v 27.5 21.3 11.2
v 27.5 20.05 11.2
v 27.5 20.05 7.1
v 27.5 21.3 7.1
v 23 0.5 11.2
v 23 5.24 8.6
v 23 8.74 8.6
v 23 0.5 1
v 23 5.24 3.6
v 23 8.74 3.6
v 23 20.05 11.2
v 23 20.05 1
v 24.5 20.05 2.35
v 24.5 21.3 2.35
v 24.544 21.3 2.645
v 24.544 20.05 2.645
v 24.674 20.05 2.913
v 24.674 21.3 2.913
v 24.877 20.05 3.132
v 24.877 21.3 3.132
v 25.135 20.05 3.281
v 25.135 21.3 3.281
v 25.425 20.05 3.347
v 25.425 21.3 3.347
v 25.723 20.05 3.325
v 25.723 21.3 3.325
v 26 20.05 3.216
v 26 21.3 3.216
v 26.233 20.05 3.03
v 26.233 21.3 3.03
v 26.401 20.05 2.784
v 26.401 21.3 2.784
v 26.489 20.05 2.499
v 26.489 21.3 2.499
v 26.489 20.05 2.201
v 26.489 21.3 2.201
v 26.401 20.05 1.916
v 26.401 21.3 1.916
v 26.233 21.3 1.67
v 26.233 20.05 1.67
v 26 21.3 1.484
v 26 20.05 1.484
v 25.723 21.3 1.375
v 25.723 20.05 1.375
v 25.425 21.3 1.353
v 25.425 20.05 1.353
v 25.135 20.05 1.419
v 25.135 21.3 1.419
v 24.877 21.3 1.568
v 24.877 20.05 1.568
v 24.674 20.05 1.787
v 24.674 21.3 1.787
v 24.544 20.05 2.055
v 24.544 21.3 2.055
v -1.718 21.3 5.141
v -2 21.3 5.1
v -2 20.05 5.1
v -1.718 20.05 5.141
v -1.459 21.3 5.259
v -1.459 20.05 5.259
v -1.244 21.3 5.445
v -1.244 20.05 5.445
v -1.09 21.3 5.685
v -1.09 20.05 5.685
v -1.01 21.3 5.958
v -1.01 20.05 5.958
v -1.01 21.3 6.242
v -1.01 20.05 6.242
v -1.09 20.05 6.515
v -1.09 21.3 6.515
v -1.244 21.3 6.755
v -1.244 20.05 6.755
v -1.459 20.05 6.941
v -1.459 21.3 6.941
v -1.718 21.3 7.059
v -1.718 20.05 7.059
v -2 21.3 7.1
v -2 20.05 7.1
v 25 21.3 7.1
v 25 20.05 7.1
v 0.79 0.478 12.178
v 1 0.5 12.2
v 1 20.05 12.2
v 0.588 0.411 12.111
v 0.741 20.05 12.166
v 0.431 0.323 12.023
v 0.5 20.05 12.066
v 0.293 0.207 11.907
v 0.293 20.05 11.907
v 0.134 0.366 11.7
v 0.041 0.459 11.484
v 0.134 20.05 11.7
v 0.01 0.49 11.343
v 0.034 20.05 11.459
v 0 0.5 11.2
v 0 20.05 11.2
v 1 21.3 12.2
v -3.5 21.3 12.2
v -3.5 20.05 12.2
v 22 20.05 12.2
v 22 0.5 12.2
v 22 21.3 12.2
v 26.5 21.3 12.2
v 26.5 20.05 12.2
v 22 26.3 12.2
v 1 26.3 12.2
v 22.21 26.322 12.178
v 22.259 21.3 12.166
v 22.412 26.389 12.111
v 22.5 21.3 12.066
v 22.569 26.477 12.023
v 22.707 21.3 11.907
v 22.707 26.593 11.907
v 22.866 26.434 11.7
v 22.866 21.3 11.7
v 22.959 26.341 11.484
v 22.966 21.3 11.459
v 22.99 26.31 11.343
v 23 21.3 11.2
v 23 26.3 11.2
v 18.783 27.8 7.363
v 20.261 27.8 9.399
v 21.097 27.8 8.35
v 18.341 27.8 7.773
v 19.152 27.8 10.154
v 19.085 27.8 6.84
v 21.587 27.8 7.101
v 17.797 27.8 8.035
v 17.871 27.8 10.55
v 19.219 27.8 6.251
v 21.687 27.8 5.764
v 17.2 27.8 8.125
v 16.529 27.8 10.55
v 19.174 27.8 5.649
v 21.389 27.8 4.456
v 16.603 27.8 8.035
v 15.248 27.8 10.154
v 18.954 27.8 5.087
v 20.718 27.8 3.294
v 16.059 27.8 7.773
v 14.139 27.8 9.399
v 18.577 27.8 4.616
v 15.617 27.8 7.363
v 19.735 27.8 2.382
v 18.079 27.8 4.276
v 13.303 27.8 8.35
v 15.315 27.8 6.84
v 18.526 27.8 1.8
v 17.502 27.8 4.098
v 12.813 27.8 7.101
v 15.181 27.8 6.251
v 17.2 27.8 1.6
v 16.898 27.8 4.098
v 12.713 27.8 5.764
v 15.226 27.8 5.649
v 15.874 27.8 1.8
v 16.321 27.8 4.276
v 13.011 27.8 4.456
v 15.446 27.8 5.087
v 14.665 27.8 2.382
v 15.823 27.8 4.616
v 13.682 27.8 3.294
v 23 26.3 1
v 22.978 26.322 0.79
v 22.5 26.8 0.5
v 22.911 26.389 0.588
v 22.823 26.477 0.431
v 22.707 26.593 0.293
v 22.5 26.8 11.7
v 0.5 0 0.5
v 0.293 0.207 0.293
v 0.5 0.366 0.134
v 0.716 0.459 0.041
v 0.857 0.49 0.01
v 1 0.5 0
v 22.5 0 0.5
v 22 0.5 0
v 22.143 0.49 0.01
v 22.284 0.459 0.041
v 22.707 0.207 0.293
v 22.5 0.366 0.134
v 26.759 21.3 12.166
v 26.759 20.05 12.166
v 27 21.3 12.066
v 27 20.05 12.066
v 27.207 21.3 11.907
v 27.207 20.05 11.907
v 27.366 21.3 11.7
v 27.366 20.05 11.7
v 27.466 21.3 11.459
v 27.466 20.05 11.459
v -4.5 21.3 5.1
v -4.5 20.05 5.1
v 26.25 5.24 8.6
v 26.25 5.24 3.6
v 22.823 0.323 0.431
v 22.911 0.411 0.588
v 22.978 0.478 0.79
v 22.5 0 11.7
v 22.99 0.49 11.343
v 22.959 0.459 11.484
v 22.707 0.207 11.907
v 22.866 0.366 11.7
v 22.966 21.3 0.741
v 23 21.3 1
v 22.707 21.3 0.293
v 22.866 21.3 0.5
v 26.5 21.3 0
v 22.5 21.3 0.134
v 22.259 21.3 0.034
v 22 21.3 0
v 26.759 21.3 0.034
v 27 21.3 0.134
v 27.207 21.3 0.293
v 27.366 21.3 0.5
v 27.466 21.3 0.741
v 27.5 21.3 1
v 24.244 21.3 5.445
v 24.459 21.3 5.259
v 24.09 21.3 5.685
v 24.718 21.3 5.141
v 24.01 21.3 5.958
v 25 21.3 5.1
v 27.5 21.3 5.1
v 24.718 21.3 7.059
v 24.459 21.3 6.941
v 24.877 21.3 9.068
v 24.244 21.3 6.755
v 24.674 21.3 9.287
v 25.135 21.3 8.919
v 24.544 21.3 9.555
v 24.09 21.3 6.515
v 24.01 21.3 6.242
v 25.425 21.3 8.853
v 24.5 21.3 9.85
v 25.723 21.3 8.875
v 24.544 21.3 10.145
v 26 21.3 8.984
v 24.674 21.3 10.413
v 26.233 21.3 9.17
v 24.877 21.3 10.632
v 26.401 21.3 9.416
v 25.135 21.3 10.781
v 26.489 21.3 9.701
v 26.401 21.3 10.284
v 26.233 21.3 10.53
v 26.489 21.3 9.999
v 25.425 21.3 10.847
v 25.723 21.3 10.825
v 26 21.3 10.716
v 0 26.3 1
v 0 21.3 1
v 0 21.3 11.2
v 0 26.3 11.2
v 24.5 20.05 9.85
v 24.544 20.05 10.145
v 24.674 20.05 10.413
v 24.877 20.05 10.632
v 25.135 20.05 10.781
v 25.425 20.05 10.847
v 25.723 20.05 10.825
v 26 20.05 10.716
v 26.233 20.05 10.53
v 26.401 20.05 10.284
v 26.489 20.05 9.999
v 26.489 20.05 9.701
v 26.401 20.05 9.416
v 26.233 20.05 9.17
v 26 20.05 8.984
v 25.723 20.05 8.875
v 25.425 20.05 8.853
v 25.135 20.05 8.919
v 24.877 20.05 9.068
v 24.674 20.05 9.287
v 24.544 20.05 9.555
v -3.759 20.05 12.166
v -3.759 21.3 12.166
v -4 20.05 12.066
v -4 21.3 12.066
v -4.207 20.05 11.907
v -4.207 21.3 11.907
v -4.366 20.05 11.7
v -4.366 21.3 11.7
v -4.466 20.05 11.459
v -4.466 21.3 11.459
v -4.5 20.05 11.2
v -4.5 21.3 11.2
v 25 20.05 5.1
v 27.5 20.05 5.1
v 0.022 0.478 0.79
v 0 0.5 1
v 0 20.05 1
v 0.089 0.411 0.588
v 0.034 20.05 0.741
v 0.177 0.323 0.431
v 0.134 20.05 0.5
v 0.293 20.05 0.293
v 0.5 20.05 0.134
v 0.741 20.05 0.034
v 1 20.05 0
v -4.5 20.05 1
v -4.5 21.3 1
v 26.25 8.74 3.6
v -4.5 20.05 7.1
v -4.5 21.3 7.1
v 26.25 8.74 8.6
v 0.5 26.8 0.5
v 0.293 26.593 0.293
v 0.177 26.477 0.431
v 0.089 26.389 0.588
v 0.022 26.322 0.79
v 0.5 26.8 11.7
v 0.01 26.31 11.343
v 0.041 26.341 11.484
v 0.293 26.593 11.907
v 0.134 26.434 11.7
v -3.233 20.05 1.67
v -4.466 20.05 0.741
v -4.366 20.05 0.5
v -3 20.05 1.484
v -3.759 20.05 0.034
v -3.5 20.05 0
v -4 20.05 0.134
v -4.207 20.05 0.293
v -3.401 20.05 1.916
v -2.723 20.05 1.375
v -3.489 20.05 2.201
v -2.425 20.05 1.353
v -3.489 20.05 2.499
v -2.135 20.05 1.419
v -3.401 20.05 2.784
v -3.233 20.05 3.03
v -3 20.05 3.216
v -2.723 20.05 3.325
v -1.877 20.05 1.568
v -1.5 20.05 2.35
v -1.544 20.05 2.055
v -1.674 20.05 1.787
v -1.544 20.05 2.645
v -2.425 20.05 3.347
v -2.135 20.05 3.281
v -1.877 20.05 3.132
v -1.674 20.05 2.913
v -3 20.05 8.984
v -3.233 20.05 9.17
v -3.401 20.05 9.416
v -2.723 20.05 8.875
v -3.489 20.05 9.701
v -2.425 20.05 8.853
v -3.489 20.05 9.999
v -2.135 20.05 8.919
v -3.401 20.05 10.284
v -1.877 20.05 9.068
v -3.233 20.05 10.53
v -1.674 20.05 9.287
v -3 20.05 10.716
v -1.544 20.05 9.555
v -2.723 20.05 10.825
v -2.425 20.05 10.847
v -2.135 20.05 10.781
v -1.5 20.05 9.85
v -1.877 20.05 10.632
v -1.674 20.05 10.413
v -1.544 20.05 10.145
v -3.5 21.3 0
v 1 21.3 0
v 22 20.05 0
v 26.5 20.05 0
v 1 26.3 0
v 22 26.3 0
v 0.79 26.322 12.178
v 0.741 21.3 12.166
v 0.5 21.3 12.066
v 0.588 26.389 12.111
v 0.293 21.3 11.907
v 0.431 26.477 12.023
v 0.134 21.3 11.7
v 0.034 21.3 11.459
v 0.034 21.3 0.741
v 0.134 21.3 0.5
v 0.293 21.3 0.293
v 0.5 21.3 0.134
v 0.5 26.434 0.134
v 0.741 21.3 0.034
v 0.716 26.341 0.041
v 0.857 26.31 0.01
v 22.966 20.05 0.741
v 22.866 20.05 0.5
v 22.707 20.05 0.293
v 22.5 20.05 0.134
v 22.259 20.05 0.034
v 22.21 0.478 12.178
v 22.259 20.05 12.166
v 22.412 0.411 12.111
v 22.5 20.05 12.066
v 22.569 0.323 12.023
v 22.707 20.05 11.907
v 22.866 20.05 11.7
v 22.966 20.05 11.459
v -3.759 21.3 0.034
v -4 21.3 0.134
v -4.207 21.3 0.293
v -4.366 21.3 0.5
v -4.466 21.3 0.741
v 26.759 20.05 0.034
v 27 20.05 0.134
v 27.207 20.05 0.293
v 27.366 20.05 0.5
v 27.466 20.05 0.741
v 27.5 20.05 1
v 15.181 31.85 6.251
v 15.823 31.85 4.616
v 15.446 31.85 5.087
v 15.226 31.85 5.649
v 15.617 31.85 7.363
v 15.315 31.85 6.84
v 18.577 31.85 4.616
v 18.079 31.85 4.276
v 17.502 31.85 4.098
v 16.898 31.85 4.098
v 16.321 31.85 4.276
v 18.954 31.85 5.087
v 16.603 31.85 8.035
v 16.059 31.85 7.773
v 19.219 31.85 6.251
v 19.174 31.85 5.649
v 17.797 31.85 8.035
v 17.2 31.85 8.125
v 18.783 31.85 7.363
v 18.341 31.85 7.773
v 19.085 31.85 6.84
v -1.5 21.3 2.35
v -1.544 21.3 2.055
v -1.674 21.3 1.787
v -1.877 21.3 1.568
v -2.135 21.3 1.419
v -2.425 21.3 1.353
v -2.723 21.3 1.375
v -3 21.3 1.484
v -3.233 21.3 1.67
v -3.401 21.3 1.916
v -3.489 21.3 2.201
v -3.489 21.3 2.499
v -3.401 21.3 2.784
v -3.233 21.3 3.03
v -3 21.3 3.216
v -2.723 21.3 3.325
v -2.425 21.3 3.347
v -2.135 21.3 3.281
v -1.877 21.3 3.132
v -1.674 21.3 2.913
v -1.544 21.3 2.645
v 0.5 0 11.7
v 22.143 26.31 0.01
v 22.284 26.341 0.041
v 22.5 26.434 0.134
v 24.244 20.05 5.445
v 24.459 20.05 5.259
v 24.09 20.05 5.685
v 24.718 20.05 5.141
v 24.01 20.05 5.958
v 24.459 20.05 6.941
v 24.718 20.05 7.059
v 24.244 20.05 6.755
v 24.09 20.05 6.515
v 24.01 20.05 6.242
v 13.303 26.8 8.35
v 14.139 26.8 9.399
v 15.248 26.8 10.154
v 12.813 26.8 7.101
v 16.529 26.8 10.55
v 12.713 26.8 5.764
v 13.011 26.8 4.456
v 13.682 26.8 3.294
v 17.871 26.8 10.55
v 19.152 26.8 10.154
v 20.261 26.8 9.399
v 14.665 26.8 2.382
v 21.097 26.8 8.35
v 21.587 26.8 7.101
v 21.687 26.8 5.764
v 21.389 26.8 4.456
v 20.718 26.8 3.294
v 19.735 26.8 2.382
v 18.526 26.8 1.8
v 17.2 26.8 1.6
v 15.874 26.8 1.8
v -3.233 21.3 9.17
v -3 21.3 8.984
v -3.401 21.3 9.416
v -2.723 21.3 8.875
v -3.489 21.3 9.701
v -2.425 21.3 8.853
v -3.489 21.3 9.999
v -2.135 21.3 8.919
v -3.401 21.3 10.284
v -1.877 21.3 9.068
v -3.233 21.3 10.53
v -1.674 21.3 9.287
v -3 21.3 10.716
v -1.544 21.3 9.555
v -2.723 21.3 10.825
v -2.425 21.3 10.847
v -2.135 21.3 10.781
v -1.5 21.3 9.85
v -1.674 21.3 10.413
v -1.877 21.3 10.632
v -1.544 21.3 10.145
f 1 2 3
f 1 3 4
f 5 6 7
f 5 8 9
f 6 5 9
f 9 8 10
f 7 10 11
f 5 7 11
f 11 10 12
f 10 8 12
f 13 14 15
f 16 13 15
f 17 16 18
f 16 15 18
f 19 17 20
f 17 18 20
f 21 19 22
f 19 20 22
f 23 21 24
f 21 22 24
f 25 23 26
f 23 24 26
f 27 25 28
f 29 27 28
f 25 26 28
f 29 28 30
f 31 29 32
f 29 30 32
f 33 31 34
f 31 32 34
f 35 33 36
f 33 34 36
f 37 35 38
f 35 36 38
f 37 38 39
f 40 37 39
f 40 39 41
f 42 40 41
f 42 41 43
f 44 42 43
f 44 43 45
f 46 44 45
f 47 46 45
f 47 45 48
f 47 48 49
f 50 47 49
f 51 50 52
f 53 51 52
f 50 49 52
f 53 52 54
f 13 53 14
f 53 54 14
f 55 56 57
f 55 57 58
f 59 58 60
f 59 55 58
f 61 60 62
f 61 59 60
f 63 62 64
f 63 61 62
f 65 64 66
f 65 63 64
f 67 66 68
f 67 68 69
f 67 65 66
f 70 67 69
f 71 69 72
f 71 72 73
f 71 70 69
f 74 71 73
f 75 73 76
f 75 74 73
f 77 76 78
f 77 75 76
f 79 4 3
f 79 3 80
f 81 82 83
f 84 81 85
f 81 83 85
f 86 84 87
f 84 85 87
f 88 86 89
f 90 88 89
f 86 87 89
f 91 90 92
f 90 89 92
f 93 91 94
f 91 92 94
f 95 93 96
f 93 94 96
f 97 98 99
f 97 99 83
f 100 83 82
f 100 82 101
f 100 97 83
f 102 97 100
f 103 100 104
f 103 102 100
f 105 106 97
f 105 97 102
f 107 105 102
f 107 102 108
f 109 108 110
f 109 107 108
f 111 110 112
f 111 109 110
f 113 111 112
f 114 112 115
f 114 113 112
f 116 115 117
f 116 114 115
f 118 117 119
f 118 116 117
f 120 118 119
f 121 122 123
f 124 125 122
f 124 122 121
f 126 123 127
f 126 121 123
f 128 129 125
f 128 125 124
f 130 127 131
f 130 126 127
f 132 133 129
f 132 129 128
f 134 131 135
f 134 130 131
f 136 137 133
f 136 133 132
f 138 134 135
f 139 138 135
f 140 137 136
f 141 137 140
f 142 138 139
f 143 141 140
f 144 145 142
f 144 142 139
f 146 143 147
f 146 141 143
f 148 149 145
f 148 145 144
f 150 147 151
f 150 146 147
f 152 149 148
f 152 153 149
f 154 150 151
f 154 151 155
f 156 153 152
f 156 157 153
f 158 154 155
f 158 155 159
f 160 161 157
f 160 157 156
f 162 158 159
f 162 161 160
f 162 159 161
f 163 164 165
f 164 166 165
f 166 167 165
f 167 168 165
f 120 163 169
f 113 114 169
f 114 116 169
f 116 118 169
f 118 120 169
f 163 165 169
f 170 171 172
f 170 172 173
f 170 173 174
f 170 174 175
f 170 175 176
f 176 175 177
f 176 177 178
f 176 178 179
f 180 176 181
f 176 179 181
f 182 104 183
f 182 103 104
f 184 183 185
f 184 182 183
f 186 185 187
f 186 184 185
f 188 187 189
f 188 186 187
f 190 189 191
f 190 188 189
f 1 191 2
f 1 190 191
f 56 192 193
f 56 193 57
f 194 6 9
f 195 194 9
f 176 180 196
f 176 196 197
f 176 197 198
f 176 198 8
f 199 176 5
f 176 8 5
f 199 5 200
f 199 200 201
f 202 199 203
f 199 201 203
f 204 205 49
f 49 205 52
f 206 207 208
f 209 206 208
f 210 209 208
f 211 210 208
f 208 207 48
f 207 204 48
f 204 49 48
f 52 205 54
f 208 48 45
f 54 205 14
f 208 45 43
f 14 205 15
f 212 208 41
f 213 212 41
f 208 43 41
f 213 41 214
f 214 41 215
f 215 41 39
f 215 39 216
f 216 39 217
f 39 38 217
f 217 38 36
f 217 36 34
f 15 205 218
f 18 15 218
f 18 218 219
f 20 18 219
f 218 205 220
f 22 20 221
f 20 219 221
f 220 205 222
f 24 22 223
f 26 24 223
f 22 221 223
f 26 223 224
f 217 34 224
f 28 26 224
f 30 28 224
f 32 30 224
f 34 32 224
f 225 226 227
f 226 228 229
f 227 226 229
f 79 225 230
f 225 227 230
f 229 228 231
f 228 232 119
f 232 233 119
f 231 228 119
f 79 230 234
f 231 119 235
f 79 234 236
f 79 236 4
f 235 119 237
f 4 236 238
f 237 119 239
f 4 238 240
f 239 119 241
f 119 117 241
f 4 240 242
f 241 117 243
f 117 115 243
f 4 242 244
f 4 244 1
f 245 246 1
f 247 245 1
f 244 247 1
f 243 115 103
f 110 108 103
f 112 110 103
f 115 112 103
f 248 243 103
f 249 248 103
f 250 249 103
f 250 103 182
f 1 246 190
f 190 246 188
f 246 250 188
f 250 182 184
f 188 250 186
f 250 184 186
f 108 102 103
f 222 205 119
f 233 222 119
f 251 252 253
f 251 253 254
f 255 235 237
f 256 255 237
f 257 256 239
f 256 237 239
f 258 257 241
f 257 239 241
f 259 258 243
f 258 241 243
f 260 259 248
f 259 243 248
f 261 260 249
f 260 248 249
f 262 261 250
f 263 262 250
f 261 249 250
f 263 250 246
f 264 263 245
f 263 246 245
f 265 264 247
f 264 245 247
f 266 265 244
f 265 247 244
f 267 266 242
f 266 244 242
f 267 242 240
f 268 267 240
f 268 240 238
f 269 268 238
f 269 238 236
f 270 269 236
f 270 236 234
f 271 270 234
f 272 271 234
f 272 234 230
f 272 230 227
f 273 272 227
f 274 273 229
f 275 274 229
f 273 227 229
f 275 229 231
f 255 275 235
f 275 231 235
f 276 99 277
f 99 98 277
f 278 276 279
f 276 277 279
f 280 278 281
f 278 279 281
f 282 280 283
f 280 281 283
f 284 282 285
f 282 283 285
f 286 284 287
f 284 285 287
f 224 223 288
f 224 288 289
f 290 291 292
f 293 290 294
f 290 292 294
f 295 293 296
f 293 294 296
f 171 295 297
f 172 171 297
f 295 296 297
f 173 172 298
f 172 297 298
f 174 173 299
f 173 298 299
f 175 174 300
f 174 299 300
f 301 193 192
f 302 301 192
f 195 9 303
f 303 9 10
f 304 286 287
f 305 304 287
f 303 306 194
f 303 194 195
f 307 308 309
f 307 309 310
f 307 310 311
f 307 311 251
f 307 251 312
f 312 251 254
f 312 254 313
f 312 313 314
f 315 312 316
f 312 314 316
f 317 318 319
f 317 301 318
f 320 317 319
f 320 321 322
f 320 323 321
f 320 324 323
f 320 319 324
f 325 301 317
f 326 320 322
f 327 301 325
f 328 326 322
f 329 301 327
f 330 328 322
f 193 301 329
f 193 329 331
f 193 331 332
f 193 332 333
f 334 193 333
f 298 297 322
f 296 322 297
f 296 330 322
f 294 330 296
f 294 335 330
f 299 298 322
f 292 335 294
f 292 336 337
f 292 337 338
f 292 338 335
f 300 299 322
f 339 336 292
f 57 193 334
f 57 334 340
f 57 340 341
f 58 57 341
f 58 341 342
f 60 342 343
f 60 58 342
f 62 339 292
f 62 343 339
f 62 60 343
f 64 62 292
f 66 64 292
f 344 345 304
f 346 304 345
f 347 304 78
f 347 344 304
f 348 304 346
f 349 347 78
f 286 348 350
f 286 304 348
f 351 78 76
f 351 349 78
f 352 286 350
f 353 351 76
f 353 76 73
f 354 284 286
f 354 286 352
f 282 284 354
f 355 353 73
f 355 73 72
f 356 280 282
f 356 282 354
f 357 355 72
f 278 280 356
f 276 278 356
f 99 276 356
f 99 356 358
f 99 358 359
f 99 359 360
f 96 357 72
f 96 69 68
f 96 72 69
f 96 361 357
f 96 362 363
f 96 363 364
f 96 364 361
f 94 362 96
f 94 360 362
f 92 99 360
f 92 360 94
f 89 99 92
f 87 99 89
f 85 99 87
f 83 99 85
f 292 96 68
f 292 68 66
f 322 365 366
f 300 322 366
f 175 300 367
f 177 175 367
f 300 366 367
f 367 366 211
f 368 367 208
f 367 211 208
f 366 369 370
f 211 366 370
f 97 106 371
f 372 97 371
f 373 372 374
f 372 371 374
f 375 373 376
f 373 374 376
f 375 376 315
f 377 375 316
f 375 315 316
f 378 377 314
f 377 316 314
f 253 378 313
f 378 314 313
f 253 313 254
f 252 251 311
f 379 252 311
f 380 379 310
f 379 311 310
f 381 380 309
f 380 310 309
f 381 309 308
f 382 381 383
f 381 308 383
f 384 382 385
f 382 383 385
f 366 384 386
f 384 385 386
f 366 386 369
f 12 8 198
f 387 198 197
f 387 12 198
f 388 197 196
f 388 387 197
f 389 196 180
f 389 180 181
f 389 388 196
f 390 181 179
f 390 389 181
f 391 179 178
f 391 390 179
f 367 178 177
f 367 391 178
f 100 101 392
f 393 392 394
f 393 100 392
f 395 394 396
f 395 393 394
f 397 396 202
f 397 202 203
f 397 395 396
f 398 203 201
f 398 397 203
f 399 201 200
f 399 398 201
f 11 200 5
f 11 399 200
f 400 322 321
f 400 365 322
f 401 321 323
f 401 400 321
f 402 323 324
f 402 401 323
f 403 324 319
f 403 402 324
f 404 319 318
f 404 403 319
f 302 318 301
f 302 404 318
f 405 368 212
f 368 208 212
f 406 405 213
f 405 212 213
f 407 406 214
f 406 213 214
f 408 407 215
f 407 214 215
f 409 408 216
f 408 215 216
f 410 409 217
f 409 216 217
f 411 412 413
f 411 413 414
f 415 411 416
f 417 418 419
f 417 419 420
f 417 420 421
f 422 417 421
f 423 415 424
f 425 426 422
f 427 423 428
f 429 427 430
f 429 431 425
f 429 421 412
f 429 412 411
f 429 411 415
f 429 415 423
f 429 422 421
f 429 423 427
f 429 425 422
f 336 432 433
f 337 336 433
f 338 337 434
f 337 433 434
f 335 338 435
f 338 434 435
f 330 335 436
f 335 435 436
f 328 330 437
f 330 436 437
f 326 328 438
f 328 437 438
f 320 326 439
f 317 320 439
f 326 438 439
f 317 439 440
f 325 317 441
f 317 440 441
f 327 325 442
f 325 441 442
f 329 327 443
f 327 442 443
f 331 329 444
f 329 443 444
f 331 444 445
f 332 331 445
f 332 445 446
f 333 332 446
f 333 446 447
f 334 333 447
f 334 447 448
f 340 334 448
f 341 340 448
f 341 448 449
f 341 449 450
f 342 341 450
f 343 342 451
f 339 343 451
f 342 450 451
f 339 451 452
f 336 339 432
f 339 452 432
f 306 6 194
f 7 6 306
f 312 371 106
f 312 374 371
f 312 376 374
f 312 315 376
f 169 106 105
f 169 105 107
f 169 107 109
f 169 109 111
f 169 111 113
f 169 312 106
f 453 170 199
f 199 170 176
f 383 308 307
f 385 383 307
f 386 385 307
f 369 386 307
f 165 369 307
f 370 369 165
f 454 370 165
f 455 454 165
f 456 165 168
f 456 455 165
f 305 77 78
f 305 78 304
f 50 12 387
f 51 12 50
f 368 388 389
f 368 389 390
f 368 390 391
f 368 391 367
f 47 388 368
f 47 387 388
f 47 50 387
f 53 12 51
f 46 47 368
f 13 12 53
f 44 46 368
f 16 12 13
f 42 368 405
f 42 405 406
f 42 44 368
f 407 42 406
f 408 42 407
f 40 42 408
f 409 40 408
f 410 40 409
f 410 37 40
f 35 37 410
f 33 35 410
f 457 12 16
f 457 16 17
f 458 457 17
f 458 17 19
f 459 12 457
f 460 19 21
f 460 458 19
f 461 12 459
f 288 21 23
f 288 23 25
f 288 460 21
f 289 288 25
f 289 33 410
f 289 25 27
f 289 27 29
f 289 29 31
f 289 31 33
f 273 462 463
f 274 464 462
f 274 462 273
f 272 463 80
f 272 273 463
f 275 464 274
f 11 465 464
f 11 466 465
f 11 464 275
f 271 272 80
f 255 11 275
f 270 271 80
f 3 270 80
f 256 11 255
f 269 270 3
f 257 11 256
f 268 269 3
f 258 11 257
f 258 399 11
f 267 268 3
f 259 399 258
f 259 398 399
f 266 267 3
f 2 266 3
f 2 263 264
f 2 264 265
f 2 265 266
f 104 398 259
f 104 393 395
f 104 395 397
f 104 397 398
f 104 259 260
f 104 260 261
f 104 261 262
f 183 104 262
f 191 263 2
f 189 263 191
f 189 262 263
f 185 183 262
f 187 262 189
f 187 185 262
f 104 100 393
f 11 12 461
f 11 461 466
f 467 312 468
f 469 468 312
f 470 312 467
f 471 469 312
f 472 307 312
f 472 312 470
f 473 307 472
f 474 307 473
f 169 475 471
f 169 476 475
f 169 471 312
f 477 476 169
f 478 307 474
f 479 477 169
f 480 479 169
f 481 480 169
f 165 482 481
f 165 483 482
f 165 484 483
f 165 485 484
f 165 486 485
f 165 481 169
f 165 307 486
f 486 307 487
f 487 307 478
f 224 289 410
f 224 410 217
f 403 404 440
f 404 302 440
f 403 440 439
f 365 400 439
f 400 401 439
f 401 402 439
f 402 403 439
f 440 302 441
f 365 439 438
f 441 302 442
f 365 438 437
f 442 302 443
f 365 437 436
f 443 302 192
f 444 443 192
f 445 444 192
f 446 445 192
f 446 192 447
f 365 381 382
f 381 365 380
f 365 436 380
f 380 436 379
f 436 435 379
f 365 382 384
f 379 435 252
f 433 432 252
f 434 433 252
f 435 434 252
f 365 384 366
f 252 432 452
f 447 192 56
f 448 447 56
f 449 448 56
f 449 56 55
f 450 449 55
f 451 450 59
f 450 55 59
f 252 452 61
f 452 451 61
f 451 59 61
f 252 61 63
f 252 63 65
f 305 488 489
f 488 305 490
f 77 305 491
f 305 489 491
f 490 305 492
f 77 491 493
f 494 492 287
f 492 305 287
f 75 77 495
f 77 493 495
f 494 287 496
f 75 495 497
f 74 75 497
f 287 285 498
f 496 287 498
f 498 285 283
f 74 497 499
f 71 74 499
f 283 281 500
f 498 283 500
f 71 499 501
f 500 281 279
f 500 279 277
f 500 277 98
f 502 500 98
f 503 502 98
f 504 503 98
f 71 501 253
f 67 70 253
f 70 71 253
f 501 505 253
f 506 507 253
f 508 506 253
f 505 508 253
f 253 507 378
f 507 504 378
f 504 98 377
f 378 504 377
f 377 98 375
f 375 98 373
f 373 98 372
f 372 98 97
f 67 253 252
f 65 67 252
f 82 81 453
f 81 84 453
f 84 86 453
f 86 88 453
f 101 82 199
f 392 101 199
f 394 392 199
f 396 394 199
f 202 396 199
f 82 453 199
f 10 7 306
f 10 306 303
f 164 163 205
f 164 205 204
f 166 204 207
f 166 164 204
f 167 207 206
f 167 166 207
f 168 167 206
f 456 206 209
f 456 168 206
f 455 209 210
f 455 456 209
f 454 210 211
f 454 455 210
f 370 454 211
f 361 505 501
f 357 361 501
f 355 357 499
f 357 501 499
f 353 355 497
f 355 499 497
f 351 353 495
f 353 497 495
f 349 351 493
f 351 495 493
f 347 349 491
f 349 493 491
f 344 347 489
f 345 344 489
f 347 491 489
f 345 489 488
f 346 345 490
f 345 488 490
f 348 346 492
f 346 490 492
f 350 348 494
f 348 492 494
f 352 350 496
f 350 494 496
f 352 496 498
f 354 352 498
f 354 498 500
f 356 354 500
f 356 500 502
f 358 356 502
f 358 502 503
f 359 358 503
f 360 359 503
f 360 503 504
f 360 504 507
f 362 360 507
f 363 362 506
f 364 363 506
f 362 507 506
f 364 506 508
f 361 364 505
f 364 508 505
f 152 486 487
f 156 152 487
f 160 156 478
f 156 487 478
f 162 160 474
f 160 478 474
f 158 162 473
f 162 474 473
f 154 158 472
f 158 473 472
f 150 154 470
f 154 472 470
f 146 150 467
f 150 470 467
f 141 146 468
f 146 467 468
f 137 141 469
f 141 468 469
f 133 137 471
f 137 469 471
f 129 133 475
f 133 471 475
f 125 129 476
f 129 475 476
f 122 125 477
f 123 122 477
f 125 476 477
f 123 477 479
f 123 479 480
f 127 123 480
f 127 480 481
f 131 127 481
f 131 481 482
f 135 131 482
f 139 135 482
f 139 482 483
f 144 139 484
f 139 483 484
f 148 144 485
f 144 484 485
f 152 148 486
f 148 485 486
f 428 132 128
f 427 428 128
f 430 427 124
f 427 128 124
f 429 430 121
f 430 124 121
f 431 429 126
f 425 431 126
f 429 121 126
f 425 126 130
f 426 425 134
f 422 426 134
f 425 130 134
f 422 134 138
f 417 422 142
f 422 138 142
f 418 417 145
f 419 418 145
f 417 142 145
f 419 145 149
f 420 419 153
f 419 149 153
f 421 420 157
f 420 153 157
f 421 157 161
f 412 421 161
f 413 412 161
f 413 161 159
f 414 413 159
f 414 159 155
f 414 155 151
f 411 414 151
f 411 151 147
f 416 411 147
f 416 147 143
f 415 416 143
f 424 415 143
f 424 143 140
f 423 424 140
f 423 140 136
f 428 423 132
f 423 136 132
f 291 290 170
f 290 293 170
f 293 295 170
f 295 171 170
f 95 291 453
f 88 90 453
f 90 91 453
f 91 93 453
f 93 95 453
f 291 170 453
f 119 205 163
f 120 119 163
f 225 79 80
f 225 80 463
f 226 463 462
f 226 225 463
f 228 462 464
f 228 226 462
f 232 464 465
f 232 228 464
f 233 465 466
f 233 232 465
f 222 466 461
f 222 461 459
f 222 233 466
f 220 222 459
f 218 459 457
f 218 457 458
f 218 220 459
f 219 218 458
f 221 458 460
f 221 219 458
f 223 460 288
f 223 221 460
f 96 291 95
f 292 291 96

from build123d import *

# Parameters (mm, degrees)
ESQUISSE1_W             = 23
ESQUISSE1_H             = 26.8
BOSS_EXTRU_1_DEPTH      = 12.2
ESQUISSE2_W             = 32
ESQUISSE2_H             = 1.25
BOSS_EXTRU_2_DEPTH      = 12.2
ESQUISSE3_R             = 4.5
BOSS_EXTRU_3_DEPTH      = 1
ESQUISSE4_R             = 2.025
BOSS_EXTRU_4_DEPTH      = 4.05
ESQUISSE5_W             = 5
ESQUISSE5_H             = 3.5
BOSS_EXTRU_5_DEPTH      = 3.25
ESQUISSE7_R             = 1
ENL_V_MAT_EXTRU_1_DEPTH = 1.25
CHANFREIN1_SIZE         = 0.5
CONG_1_R                = 1
CONG_2_R                = 1


with BuildPart() as part:
    # Esquisse1 → Boss.-Extru.1 (new body)
    with BuildSketch(Plane.XY):
        with Locations((11.5, 13.4)):
            Rectangle(ESQUISSE1_W, ESQUISSE1_H)
    extrude(amount=BOSS_EXTRU_1_DEPTH)

    # Esquisse2 → Boss.-Extru.2 (add)
    with BuildSketch(Plane.XY.offset(12.2)):
        with Locations((11.5, 20.675)):
            Rectangle(ESQUISSE2_W, ESQUISSE2_H)
    extrude(amount=-BOSS_EXTRU_2_DEPTH)

    # Esquisse3 → Boss.-Extru.3 (add)
    with BuildSketch(Plane(origin=(0, 26.8, 0), x_dir=(1, 0, 0), z_dir=(0, 1, 0))):
        with Locations(Location((17.2, -6.1, 0), (0, 0, 90))):
            Circle(ESQUISSE3_R)
    extrude(amount=BOSS_EXTRU_3_DEPTH)

    # Esquisse4 → Boss.-Extru.4 (add)
    with BuildSketch(Plane(origin=(0, 27.8, 0), x_dir=(1, 0, 0), z_dir=(0, 1, 0))):
        with Locations(Location((17.2, -6.1, 0), (0, 0, 270))):
            Circle(ESQUISSE4_R)
    extrude(amount=BOSS_EXTRU_4_DEPTH)

    # Esquisse5 → Boss.-Extru.5 (add)
    with BuildSketch(Plane(origin=(23, 0, 0), x_dir=(0, 0, -1), z_dir=(1, 0, 0))):
        with Locations((-6.1, 6.99)):
            Rectangle(ESQUISSE5_W, ESQUISSE5_H)
    extrude(amount=BOSS_EXTRU_5_DEPTH)

    # Esquisse7 → Enlèv. mat.-Extru.1 (cut)
    with BuildSketch(Plane(origin=(0, 21.3, 0), x_dir=(1, 0, 0), z_dir=(0, 1, 0))):
        with Locations(Location((25.5, -2.35, 0), (0, 0, 180))):
            Circle(ESQUISSE7_R)
        with Locations(Location((25.5, -9.85, 0), (0, 0, 180))):
            Circle(ESQUISSE7_R)
        with Locations((-2.5, -9.85)):
            Circle(ESQUISSE7_R)
        with Locations((-2.5, -2.35)):
            Circle(ESQUISSE7_R)
        with BuildLine():
            Line((30, -7.1), (25, -7.1))
            ThreePointArc((25, -7.1), (24, -6.1), (25, -5.1))
            Line((25, -5.1), (30, -5.1))
            ThreePointArc((30, -5.1), (31, -6.1), (30, -7.1))
        make_face()
        with BuildLine():
            Line((-7, -5.1), (-2, -5.1))
            ThreePointArc((-2, -5.1), (-1, -6.1), (-2, -7.1))
            Line((-2, -7.1), (-7, -7.1))
            ThreePointArc((-7, -7.1), (-8, -6.1), (-7, -5.1))
        make_face()
    extrude(amount=-ENL_V_MAT_EXTRU_1_DEPTH, mode=Mode.SUBTRACT)

    # Chanfrein1
    chanfrein1_edges = [part.edges().sort_by_distance(p)[0] for p in [
        (11.5, 26.8, 12.2),
        (11.5, 26.8, 0),
        (11.5, 0, 0),
        (11.5, 0, 12.2),
        (0, 26.8, 6.1),
        (23, 26.8, 6.1),
        (23, 0, 6.1),
        (0, 0, 6.1),
    ]]
    chamfer(chanfrein1_edges, length=CHANFREIN1_SIZE)

    # Congé1
    cong_1_edges = [part.edges().sort_by_distance(p)[0] for p in [
        (23, 10.275, 12.2),
        (0, 10.275, 0),
        (23, 10.275, 0),
        (0, 23.8, 12.2),
        (23, 23.8, 0),
        (0, 23.8, 0),
        (0, 10.275, 12.2),
        (23, 23.8, 12.2),
        (23, 10.275, 0),
        (0, 10.275, 0),
        (23, 10.275, 12.2),
        (0, 10.275, 12.2),
        (0, 10.275, 0),
        (23, 10.275, 0),
        (23, 10.275, 12.2),
        (0, 10.275, 12.2),
    ]]
    fillet(cong_1_edges, radius=CONG_1_R)

    # Congé2
    cong_2_edges = [part.edges().sort_by_distance(p)[0] for p in [
        (-4.5, 20.675, 12.2),
        (27.5, 20.675, 12.2),
        (27.5, 20.675, 0),
        (-4.5, 20.675, 0),
    ]]
    fillet(cong_2_edges, radius=CONG_2_R)


solid = part.part
